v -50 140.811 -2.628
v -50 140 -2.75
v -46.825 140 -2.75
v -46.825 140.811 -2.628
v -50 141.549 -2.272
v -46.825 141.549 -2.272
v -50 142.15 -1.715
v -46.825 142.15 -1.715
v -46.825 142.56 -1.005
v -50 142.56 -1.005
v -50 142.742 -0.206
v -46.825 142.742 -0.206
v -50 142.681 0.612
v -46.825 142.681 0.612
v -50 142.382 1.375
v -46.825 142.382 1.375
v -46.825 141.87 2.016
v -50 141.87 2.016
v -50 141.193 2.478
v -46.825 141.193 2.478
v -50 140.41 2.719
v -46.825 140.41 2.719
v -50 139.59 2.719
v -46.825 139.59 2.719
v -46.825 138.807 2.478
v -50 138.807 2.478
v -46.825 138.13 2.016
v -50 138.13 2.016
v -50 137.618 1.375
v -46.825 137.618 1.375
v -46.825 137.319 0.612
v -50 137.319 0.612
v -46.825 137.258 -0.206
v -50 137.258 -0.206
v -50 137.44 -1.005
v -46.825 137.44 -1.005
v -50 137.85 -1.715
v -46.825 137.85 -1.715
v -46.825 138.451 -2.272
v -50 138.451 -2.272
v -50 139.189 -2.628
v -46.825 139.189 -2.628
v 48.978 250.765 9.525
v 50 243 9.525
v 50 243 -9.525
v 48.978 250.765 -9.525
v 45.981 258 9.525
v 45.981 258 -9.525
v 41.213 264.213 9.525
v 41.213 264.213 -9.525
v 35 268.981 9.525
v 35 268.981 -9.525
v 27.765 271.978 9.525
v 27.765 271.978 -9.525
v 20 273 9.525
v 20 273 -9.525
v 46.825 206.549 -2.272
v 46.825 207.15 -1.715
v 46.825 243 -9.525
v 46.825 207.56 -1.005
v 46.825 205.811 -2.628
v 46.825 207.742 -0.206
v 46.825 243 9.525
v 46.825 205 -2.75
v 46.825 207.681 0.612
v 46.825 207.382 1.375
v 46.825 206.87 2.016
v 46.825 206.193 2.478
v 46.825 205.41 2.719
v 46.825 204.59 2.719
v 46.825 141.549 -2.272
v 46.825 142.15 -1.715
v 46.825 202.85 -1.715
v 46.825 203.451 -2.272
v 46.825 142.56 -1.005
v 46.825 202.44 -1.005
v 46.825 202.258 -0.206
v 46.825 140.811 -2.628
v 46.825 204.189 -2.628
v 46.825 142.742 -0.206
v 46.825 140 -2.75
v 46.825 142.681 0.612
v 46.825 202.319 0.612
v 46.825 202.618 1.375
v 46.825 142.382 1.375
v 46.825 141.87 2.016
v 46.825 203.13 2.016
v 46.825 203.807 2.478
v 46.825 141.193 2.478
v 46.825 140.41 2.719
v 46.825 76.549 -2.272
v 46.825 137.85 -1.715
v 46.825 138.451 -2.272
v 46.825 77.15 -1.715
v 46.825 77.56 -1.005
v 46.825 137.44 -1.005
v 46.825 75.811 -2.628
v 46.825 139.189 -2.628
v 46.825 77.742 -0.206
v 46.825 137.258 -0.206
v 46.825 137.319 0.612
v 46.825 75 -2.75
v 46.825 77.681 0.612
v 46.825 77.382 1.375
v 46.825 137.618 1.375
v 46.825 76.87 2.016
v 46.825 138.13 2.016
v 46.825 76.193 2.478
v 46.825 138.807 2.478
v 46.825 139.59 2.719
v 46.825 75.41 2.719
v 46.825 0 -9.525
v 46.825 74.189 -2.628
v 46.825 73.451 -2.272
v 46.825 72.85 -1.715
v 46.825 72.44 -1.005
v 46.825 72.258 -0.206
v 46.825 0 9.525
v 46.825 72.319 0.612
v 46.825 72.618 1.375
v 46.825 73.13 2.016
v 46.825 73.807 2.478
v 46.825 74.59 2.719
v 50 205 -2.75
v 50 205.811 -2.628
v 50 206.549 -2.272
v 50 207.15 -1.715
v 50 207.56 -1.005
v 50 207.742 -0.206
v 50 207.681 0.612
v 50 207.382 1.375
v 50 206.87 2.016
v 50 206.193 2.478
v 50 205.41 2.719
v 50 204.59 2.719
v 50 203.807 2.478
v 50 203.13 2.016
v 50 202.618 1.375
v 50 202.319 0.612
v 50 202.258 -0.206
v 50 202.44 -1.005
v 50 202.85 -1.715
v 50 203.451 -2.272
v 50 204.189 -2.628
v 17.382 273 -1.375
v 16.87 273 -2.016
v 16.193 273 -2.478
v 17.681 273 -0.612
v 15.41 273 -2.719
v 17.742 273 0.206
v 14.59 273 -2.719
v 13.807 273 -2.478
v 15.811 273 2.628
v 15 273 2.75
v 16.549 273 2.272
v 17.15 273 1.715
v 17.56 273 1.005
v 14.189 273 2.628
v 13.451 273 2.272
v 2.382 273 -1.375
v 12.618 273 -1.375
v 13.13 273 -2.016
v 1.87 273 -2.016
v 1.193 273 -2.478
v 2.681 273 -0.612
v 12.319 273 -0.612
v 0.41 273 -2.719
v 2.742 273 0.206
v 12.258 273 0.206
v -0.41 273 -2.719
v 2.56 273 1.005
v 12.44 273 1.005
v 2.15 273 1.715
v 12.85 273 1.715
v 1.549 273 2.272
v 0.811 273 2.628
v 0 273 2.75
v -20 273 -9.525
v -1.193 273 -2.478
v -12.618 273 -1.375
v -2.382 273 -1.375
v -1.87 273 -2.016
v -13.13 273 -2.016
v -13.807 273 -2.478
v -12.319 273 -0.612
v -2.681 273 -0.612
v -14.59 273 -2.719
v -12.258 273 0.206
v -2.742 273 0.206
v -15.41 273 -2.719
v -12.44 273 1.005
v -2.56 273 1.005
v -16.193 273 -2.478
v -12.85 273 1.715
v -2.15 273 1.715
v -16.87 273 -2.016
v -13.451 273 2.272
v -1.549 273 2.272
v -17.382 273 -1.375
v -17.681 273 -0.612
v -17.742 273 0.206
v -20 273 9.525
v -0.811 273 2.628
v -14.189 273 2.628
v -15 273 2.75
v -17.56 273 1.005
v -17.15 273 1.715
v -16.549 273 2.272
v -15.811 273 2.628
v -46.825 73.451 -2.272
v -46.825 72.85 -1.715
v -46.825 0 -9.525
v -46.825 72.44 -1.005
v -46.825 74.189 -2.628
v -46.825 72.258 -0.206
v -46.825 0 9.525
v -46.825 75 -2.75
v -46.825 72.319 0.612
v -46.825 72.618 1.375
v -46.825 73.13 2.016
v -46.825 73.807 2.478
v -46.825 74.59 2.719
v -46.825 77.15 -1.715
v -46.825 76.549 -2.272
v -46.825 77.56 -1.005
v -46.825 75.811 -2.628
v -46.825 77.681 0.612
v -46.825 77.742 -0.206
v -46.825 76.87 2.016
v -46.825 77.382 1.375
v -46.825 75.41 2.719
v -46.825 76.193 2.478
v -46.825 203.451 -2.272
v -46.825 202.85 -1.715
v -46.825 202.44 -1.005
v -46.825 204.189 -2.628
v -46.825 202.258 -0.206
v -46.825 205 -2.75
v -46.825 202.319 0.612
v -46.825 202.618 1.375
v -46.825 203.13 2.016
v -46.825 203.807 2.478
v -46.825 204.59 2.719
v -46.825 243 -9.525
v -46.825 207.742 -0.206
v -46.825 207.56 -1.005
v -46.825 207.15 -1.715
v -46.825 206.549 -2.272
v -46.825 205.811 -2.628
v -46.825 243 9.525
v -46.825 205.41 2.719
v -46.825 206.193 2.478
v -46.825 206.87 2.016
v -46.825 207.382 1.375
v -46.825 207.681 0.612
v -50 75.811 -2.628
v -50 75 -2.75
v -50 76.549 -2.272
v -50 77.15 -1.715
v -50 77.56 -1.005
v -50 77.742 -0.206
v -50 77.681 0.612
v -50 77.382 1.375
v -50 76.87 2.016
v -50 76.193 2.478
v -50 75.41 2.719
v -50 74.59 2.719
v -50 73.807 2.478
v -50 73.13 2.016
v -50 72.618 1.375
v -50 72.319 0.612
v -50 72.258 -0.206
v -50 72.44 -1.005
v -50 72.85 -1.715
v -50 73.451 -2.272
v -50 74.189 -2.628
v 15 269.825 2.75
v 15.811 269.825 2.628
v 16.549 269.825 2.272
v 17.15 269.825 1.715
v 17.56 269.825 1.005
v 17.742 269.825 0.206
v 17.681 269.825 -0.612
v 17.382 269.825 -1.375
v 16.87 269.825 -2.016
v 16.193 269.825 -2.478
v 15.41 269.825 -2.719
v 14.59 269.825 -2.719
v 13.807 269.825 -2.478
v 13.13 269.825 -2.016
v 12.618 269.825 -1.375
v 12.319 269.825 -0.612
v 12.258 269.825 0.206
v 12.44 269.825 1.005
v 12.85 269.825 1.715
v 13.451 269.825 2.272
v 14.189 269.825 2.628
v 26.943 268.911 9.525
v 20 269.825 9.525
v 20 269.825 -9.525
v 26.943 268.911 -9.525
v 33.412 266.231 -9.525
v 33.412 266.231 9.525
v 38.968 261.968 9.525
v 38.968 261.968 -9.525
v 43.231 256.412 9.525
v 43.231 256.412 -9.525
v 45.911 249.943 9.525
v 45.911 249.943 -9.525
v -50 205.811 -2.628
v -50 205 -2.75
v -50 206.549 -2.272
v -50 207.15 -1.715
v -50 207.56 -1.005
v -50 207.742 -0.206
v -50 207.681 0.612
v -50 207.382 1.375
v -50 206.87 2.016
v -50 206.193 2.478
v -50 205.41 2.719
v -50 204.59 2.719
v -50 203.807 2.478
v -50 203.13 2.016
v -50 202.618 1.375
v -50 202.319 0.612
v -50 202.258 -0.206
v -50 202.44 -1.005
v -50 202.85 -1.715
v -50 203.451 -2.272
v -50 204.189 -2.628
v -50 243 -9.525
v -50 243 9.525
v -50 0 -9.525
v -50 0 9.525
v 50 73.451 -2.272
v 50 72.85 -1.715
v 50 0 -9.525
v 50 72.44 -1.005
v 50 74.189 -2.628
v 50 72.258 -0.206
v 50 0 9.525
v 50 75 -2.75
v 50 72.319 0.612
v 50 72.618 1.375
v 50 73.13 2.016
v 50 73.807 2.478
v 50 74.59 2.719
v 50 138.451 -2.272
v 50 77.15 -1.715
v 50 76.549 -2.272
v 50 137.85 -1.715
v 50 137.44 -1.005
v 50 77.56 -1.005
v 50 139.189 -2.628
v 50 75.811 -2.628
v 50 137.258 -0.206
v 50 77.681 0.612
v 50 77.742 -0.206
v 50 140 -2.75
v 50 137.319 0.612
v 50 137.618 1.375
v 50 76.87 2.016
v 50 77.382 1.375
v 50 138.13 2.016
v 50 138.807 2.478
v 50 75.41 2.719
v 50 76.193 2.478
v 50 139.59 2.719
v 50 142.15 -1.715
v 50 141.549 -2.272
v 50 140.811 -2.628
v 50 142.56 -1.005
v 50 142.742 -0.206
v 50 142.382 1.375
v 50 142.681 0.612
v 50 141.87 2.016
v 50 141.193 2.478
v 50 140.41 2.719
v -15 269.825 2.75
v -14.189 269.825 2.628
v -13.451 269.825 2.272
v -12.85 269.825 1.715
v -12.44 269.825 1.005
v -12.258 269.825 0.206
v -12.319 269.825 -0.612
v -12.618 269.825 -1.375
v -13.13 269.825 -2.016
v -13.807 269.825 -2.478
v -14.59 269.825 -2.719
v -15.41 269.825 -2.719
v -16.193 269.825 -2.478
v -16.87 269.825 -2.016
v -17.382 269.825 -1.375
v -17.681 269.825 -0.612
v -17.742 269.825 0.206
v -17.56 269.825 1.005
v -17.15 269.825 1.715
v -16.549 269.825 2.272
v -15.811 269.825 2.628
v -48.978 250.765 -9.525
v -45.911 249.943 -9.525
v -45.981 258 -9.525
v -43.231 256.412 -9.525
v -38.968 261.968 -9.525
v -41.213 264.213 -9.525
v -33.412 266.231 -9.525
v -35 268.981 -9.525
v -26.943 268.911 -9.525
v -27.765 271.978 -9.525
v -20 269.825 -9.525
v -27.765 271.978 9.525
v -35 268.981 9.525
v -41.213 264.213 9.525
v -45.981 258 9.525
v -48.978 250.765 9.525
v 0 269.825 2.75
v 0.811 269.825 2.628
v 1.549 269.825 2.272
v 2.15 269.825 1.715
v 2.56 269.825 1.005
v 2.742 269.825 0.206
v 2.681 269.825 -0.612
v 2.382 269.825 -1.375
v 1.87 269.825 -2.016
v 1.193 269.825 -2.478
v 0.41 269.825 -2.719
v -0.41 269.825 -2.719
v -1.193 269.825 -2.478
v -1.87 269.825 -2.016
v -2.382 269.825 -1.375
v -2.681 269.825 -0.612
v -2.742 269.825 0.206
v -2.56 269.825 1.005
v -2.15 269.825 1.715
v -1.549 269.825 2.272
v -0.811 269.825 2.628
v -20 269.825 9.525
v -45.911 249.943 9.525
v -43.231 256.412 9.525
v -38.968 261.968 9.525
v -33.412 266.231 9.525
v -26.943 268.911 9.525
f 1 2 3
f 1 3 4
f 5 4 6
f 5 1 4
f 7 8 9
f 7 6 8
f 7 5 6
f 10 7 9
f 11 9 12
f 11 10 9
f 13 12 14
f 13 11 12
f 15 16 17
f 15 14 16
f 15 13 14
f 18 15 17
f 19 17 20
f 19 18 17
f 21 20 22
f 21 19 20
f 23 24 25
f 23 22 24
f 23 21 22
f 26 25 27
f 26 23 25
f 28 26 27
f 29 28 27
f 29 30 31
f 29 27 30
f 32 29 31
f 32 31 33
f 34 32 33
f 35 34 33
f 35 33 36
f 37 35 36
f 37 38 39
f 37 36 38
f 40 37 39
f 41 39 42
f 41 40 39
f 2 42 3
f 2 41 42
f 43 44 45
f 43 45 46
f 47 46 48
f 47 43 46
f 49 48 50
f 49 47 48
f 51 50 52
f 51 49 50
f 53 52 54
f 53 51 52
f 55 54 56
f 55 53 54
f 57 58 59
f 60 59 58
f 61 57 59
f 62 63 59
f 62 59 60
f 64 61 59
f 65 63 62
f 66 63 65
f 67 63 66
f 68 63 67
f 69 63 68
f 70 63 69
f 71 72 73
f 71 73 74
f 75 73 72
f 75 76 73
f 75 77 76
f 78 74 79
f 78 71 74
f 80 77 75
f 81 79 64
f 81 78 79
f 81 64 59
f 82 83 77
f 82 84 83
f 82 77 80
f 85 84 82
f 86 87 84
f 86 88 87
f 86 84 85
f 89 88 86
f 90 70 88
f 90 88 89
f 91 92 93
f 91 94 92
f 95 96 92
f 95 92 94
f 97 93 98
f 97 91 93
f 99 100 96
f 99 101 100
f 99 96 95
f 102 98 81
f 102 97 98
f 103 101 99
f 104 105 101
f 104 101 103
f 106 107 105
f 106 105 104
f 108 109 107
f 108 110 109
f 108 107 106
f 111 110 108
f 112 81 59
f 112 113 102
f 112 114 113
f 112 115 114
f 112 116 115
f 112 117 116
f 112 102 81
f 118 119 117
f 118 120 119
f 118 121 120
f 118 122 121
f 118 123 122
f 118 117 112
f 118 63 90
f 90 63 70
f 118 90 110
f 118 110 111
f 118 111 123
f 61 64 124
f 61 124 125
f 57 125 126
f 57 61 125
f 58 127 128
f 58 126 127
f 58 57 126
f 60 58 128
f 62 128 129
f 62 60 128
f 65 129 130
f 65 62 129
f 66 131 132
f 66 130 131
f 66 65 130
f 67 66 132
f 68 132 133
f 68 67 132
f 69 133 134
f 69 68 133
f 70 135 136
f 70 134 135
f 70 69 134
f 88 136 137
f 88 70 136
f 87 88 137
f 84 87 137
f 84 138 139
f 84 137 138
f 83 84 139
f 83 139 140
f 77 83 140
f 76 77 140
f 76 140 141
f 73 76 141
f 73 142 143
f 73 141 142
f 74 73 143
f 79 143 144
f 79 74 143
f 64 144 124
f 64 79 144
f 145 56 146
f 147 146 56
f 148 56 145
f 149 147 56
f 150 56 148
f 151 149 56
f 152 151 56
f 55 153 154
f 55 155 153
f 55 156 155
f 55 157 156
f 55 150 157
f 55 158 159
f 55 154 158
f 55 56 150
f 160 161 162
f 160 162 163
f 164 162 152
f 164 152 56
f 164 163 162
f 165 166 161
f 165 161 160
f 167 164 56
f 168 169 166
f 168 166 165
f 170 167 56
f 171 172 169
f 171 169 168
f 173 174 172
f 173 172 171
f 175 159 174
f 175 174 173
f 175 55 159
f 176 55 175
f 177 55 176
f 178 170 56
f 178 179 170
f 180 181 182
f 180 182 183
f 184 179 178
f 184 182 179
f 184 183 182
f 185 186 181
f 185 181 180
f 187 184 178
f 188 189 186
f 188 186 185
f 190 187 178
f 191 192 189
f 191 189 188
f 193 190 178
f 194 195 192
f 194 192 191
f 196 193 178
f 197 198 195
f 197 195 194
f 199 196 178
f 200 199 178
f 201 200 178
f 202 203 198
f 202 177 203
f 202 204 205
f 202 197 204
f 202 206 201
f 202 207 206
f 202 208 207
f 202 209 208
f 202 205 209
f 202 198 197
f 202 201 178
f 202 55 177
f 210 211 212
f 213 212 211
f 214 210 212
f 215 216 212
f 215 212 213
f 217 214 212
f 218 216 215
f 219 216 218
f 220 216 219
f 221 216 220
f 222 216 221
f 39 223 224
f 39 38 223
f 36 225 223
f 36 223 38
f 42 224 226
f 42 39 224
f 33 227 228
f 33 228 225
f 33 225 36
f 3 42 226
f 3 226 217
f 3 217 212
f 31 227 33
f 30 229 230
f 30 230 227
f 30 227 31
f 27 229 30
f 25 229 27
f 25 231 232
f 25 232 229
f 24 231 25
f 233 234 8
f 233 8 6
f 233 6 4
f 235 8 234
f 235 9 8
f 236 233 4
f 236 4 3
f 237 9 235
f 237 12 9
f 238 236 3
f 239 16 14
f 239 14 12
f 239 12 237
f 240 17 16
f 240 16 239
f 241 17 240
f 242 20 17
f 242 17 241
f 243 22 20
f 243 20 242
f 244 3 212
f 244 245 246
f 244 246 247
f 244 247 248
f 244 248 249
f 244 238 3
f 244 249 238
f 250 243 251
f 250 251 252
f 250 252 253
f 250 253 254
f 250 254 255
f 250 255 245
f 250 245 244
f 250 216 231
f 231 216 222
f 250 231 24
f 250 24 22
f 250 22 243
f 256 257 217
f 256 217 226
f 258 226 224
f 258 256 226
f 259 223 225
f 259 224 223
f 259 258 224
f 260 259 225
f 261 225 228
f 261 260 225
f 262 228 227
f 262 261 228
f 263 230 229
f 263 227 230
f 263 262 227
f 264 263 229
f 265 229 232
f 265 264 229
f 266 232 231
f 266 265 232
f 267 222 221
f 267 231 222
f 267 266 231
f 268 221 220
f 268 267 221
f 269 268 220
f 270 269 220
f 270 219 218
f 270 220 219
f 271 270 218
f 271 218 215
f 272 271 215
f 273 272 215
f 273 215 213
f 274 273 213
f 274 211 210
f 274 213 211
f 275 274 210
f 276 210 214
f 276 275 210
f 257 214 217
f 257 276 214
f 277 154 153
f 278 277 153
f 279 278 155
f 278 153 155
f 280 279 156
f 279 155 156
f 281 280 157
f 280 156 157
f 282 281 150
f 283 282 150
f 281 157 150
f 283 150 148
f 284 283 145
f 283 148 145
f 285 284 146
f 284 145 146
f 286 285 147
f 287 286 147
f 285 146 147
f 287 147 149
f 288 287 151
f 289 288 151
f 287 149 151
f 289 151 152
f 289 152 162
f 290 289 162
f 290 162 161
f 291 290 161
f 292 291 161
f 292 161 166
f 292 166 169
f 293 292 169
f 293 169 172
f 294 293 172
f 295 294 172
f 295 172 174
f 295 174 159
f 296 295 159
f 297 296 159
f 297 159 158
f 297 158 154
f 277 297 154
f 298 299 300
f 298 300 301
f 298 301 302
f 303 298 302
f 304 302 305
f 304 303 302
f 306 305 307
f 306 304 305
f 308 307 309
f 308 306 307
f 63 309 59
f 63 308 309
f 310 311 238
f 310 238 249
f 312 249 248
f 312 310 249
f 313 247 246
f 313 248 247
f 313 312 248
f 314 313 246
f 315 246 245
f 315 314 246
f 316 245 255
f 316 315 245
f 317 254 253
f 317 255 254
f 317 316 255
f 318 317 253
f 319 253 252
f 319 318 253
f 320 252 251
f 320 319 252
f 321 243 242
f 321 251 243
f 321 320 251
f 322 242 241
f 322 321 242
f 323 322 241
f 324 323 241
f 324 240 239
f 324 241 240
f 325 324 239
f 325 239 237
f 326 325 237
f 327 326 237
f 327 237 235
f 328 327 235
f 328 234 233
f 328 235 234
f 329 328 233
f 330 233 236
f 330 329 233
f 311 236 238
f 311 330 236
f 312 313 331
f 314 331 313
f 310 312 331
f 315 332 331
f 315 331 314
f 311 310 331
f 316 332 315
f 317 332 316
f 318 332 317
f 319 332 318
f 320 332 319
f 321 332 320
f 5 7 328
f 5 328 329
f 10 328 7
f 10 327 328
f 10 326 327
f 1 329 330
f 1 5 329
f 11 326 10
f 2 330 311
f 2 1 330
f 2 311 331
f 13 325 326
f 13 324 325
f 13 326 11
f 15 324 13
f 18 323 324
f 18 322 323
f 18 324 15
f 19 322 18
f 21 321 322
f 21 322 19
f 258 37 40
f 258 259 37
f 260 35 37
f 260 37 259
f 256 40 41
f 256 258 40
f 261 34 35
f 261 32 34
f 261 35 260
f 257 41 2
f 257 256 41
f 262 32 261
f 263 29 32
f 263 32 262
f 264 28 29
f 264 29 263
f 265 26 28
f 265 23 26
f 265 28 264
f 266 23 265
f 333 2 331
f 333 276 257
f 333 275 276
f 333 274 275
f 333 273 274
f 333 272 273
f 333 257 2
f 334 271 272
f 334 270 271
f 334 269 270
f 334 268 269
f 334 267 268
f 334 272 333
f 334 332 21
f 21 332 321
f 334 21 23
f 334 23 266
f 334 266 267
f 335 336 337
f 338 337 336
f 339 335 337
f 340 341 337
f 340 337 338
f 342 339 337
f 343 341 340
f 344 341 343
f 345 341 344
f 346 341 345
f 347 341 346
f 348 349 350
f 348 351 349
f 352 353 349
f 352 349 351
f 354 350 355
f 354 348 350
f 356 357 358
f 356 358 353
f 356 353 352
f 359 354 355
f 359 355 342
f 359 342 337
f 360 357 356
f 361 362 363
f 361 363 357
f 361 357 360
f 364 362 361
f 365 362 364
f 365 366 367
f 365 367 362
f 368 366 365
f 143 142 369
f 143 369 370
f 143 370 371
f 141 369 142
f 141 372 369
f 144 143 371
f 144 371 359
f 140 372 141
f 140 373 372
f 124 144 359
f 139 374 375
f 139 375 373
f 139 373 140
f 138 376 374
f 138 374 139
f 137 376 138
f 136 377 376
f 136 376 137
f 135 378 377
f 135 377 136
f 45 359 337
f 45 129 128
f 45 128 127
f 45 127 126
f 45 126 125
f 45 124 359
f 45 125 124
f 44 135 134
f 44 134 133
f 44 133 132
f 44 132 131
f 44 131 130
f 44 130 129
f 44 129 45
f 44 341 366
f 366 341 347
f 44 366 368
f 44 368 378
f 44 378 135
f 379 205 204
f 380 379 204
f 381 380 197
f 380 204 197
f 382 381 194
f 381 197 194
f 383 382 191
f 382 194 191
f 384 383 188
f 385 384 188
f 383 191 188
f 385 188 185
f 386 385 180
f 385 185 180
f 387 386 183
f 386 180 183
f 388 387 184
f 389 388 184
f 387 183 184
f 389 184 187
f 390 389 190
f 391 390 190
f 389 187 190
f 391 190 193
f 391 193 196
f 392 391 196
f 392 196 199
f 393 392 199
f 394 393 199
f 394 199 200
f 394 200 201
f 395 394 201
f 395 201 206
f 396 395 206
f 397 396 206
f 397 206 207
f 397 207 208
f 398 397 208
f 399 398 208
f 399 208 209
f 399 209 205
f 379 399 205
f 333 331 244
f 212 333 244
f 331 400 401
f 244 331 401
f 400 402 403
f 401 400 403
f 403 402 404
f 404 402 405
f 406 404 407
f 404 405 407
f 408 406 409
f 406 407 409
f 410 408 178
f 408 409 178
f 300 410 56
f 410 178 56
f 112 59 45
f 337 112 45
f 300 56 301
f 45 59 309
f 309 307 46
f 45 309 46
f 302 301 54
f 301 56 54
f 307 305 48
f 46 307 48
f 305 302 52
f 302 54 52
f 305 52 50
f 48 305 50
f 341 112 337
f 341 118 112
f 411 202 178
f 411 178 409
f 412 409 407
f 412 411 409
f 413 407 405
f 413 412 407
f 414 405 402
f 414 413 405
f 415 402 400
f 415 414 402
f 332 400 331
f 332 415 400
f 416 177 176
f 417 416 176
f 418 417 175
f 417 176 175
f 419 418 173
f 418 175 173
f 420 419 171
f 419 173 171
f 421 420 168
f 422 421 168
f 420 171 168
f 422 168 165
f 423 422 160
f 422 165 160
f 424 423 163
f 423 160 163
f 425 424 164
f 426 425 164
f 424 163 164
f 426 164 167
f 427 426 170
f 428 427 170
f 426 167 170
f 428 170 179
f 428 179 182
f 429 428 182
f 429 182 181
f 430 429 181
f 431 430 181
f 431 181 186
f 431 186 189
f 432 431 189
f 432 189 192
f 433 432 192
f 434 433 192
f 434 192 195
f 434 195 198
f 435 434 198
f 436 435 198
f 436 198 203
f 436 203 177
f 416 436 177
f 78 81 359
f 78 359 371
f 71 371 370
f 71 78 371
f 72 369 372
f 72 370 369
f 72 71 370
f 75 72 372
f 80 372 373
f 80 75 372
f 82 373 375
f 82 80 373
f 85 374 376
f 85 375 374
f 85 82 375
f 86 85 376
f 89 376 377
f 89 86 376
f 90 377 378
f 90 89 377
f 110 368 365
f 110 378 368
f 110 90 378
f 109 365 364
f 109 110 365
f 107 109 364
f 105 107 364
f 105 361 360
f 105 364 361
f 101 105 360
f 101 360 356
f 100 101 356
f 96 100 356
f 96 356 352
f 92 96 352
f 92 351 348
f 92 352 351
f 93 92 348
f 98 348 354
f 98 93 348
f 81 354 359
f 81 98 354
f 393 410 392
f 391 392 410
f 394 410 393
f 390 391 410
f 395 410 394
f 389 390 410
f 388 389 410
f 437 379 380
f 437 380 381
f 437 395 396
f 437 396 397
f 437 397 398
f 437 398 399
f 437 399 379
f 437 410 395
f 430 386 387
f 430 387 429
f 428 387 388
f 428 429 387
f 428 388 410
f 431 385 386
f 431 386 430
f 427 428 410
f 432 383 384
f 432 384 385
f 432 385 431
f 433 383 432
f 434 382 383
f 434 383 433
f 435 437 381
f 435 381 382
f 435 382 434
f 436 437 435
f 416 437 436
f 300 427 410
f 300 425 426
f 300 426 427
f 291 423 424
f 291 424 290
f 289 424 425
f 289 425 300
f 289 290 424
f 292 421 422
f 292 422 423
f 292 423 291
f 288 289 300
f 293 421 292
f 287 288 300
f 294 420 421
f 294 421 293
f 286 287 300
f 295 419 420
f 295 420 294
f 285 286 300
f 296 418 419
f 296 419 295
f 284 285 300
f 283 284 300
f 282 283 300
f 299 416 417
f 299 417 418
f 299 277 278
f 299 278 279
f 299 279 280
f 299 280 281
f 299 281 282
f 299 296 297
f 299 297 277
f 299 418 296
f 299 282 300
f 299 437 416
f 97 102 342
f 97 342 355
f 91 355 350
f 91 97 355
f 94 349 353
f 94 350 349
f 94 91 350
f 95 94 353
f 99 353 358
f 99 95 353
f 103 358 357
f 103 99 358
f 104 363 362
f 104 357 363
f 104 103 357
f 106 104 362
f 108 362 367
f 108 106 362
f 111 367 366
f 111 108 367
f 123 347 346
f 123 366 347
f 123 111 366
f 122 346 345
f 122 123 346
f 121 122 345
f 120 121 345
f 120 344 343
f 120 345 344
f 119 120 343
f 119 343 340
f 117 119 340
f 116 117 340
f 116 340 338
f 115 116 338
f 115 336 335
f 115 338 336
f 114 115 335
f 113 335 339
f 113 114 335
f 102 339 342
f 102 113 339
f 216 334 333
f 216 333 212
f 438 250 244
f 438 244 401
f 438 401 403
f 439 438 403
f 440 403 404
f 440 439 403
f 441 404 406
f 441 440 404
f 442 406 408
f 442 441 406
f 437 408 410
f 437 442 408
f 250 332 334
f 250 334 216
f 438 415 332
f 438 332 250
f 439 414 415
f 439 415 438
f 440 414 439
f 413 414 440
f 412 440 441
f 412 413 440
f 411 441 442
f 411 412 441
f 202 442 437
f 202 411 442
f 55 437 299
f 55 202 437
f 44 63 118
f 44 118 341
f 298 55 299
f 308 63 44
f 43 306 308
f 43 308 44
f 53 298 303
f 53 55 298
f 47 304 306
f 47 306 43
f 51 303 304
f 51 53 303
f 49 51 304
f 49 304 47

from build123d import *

# Parameters (mm, degrees)
BOSS_EXTRUDE1_DEPTH     = 9.525
SKETCH12_R              = 2.75
CUT_EXTRUDE2_DEPTH      = 278.704385318
CUT_EXTRUDE3_DEPTH      = 291.894698516
CUT_EXTRUDE3_DEPTH_BACK = 291.894698516
SKETCH13_R              = 2.75


with BuildPart() as part:
    # Sketch1 → Boss-Extrude1 (new, symmetric)
    with BuildSketch(Plane.XY):
        with BuildLine():
            Line((50, 0), (50, 243))
            ThreePointArc((50, 243), (41.213203436, 264.213203436), (20, 273))
            Line((20, 273), (-20, 273))
            ThreePointArc((-20, 273), (-41.213203436, 264.213203436), (-50, 243))
            Line((-50, 243), (-50, 0))
            Line((-50, 0), (-46.825, 0))
            Line((-46.825, 0), (-46.825, 243))
            ThreePointArc((-46.825, 243), (-38.968139405, 261.968139405), (-20, 269.825))
            Line((-20, 269.825), (20, 269.825))
            ThreePointArc((20, 269.825), (38.968139405, 261.968139405), (46.825, 243))
            Line((46.825, 243), (46.825, 0))
            Line((46.825, 0), (50, 0))
        make_face()
    extrude(amount=BOSS_EXTRUDE1_DEPTH, both=True)

    # Sketch12 → Cut-Extrude2 (cut, through all)
    with BuildSketch(Plane(origin=(0, 273, 0), x_dir=(1, 0, 0), z_dir=(0, 1, 0))):
        with Locations(Location((0, 0, 0), (0, 0, 270))):
            Circle(SKETCH12_R)
        with Locations(Location((-15, 0, 0), (0, 0, 270))):
            Circle(SKETCH12_R)
        with Locations(Location((15, 0, 0), (0, 0, 270))):
            Circle(SKETCH12_R)
    extrude(amount=-CUT_EXTRUDE2_DEPTH, mode=Mode.SUBTRACT)

    # Sketch13 → Cut-Extrude3 (cut, two sides: drawn at the far end of the back side and taken through both)
    with BuildSketch(Plane(origin=(50, 0, 0), x_dir=(0, 0, -1), z_dir=(1, 0, 0)).offset(-CUT_EXTRUDE3_DEPTH_BACK)):
        with Locations((0, 205)):
            Circle(SKETCH13_R)
        with Locations((0, 140)):
            Circle(SKETCH13_R)
        with Locations((0, 75)):
            Circle(SKETCH13_R)
    extrude(amount=CUT_EXTRUDE3_DEPTH + CUT_EXTRUDE3_DEPTH_BACK, mode=Mode.SUBTRACT)


solid = part.part
